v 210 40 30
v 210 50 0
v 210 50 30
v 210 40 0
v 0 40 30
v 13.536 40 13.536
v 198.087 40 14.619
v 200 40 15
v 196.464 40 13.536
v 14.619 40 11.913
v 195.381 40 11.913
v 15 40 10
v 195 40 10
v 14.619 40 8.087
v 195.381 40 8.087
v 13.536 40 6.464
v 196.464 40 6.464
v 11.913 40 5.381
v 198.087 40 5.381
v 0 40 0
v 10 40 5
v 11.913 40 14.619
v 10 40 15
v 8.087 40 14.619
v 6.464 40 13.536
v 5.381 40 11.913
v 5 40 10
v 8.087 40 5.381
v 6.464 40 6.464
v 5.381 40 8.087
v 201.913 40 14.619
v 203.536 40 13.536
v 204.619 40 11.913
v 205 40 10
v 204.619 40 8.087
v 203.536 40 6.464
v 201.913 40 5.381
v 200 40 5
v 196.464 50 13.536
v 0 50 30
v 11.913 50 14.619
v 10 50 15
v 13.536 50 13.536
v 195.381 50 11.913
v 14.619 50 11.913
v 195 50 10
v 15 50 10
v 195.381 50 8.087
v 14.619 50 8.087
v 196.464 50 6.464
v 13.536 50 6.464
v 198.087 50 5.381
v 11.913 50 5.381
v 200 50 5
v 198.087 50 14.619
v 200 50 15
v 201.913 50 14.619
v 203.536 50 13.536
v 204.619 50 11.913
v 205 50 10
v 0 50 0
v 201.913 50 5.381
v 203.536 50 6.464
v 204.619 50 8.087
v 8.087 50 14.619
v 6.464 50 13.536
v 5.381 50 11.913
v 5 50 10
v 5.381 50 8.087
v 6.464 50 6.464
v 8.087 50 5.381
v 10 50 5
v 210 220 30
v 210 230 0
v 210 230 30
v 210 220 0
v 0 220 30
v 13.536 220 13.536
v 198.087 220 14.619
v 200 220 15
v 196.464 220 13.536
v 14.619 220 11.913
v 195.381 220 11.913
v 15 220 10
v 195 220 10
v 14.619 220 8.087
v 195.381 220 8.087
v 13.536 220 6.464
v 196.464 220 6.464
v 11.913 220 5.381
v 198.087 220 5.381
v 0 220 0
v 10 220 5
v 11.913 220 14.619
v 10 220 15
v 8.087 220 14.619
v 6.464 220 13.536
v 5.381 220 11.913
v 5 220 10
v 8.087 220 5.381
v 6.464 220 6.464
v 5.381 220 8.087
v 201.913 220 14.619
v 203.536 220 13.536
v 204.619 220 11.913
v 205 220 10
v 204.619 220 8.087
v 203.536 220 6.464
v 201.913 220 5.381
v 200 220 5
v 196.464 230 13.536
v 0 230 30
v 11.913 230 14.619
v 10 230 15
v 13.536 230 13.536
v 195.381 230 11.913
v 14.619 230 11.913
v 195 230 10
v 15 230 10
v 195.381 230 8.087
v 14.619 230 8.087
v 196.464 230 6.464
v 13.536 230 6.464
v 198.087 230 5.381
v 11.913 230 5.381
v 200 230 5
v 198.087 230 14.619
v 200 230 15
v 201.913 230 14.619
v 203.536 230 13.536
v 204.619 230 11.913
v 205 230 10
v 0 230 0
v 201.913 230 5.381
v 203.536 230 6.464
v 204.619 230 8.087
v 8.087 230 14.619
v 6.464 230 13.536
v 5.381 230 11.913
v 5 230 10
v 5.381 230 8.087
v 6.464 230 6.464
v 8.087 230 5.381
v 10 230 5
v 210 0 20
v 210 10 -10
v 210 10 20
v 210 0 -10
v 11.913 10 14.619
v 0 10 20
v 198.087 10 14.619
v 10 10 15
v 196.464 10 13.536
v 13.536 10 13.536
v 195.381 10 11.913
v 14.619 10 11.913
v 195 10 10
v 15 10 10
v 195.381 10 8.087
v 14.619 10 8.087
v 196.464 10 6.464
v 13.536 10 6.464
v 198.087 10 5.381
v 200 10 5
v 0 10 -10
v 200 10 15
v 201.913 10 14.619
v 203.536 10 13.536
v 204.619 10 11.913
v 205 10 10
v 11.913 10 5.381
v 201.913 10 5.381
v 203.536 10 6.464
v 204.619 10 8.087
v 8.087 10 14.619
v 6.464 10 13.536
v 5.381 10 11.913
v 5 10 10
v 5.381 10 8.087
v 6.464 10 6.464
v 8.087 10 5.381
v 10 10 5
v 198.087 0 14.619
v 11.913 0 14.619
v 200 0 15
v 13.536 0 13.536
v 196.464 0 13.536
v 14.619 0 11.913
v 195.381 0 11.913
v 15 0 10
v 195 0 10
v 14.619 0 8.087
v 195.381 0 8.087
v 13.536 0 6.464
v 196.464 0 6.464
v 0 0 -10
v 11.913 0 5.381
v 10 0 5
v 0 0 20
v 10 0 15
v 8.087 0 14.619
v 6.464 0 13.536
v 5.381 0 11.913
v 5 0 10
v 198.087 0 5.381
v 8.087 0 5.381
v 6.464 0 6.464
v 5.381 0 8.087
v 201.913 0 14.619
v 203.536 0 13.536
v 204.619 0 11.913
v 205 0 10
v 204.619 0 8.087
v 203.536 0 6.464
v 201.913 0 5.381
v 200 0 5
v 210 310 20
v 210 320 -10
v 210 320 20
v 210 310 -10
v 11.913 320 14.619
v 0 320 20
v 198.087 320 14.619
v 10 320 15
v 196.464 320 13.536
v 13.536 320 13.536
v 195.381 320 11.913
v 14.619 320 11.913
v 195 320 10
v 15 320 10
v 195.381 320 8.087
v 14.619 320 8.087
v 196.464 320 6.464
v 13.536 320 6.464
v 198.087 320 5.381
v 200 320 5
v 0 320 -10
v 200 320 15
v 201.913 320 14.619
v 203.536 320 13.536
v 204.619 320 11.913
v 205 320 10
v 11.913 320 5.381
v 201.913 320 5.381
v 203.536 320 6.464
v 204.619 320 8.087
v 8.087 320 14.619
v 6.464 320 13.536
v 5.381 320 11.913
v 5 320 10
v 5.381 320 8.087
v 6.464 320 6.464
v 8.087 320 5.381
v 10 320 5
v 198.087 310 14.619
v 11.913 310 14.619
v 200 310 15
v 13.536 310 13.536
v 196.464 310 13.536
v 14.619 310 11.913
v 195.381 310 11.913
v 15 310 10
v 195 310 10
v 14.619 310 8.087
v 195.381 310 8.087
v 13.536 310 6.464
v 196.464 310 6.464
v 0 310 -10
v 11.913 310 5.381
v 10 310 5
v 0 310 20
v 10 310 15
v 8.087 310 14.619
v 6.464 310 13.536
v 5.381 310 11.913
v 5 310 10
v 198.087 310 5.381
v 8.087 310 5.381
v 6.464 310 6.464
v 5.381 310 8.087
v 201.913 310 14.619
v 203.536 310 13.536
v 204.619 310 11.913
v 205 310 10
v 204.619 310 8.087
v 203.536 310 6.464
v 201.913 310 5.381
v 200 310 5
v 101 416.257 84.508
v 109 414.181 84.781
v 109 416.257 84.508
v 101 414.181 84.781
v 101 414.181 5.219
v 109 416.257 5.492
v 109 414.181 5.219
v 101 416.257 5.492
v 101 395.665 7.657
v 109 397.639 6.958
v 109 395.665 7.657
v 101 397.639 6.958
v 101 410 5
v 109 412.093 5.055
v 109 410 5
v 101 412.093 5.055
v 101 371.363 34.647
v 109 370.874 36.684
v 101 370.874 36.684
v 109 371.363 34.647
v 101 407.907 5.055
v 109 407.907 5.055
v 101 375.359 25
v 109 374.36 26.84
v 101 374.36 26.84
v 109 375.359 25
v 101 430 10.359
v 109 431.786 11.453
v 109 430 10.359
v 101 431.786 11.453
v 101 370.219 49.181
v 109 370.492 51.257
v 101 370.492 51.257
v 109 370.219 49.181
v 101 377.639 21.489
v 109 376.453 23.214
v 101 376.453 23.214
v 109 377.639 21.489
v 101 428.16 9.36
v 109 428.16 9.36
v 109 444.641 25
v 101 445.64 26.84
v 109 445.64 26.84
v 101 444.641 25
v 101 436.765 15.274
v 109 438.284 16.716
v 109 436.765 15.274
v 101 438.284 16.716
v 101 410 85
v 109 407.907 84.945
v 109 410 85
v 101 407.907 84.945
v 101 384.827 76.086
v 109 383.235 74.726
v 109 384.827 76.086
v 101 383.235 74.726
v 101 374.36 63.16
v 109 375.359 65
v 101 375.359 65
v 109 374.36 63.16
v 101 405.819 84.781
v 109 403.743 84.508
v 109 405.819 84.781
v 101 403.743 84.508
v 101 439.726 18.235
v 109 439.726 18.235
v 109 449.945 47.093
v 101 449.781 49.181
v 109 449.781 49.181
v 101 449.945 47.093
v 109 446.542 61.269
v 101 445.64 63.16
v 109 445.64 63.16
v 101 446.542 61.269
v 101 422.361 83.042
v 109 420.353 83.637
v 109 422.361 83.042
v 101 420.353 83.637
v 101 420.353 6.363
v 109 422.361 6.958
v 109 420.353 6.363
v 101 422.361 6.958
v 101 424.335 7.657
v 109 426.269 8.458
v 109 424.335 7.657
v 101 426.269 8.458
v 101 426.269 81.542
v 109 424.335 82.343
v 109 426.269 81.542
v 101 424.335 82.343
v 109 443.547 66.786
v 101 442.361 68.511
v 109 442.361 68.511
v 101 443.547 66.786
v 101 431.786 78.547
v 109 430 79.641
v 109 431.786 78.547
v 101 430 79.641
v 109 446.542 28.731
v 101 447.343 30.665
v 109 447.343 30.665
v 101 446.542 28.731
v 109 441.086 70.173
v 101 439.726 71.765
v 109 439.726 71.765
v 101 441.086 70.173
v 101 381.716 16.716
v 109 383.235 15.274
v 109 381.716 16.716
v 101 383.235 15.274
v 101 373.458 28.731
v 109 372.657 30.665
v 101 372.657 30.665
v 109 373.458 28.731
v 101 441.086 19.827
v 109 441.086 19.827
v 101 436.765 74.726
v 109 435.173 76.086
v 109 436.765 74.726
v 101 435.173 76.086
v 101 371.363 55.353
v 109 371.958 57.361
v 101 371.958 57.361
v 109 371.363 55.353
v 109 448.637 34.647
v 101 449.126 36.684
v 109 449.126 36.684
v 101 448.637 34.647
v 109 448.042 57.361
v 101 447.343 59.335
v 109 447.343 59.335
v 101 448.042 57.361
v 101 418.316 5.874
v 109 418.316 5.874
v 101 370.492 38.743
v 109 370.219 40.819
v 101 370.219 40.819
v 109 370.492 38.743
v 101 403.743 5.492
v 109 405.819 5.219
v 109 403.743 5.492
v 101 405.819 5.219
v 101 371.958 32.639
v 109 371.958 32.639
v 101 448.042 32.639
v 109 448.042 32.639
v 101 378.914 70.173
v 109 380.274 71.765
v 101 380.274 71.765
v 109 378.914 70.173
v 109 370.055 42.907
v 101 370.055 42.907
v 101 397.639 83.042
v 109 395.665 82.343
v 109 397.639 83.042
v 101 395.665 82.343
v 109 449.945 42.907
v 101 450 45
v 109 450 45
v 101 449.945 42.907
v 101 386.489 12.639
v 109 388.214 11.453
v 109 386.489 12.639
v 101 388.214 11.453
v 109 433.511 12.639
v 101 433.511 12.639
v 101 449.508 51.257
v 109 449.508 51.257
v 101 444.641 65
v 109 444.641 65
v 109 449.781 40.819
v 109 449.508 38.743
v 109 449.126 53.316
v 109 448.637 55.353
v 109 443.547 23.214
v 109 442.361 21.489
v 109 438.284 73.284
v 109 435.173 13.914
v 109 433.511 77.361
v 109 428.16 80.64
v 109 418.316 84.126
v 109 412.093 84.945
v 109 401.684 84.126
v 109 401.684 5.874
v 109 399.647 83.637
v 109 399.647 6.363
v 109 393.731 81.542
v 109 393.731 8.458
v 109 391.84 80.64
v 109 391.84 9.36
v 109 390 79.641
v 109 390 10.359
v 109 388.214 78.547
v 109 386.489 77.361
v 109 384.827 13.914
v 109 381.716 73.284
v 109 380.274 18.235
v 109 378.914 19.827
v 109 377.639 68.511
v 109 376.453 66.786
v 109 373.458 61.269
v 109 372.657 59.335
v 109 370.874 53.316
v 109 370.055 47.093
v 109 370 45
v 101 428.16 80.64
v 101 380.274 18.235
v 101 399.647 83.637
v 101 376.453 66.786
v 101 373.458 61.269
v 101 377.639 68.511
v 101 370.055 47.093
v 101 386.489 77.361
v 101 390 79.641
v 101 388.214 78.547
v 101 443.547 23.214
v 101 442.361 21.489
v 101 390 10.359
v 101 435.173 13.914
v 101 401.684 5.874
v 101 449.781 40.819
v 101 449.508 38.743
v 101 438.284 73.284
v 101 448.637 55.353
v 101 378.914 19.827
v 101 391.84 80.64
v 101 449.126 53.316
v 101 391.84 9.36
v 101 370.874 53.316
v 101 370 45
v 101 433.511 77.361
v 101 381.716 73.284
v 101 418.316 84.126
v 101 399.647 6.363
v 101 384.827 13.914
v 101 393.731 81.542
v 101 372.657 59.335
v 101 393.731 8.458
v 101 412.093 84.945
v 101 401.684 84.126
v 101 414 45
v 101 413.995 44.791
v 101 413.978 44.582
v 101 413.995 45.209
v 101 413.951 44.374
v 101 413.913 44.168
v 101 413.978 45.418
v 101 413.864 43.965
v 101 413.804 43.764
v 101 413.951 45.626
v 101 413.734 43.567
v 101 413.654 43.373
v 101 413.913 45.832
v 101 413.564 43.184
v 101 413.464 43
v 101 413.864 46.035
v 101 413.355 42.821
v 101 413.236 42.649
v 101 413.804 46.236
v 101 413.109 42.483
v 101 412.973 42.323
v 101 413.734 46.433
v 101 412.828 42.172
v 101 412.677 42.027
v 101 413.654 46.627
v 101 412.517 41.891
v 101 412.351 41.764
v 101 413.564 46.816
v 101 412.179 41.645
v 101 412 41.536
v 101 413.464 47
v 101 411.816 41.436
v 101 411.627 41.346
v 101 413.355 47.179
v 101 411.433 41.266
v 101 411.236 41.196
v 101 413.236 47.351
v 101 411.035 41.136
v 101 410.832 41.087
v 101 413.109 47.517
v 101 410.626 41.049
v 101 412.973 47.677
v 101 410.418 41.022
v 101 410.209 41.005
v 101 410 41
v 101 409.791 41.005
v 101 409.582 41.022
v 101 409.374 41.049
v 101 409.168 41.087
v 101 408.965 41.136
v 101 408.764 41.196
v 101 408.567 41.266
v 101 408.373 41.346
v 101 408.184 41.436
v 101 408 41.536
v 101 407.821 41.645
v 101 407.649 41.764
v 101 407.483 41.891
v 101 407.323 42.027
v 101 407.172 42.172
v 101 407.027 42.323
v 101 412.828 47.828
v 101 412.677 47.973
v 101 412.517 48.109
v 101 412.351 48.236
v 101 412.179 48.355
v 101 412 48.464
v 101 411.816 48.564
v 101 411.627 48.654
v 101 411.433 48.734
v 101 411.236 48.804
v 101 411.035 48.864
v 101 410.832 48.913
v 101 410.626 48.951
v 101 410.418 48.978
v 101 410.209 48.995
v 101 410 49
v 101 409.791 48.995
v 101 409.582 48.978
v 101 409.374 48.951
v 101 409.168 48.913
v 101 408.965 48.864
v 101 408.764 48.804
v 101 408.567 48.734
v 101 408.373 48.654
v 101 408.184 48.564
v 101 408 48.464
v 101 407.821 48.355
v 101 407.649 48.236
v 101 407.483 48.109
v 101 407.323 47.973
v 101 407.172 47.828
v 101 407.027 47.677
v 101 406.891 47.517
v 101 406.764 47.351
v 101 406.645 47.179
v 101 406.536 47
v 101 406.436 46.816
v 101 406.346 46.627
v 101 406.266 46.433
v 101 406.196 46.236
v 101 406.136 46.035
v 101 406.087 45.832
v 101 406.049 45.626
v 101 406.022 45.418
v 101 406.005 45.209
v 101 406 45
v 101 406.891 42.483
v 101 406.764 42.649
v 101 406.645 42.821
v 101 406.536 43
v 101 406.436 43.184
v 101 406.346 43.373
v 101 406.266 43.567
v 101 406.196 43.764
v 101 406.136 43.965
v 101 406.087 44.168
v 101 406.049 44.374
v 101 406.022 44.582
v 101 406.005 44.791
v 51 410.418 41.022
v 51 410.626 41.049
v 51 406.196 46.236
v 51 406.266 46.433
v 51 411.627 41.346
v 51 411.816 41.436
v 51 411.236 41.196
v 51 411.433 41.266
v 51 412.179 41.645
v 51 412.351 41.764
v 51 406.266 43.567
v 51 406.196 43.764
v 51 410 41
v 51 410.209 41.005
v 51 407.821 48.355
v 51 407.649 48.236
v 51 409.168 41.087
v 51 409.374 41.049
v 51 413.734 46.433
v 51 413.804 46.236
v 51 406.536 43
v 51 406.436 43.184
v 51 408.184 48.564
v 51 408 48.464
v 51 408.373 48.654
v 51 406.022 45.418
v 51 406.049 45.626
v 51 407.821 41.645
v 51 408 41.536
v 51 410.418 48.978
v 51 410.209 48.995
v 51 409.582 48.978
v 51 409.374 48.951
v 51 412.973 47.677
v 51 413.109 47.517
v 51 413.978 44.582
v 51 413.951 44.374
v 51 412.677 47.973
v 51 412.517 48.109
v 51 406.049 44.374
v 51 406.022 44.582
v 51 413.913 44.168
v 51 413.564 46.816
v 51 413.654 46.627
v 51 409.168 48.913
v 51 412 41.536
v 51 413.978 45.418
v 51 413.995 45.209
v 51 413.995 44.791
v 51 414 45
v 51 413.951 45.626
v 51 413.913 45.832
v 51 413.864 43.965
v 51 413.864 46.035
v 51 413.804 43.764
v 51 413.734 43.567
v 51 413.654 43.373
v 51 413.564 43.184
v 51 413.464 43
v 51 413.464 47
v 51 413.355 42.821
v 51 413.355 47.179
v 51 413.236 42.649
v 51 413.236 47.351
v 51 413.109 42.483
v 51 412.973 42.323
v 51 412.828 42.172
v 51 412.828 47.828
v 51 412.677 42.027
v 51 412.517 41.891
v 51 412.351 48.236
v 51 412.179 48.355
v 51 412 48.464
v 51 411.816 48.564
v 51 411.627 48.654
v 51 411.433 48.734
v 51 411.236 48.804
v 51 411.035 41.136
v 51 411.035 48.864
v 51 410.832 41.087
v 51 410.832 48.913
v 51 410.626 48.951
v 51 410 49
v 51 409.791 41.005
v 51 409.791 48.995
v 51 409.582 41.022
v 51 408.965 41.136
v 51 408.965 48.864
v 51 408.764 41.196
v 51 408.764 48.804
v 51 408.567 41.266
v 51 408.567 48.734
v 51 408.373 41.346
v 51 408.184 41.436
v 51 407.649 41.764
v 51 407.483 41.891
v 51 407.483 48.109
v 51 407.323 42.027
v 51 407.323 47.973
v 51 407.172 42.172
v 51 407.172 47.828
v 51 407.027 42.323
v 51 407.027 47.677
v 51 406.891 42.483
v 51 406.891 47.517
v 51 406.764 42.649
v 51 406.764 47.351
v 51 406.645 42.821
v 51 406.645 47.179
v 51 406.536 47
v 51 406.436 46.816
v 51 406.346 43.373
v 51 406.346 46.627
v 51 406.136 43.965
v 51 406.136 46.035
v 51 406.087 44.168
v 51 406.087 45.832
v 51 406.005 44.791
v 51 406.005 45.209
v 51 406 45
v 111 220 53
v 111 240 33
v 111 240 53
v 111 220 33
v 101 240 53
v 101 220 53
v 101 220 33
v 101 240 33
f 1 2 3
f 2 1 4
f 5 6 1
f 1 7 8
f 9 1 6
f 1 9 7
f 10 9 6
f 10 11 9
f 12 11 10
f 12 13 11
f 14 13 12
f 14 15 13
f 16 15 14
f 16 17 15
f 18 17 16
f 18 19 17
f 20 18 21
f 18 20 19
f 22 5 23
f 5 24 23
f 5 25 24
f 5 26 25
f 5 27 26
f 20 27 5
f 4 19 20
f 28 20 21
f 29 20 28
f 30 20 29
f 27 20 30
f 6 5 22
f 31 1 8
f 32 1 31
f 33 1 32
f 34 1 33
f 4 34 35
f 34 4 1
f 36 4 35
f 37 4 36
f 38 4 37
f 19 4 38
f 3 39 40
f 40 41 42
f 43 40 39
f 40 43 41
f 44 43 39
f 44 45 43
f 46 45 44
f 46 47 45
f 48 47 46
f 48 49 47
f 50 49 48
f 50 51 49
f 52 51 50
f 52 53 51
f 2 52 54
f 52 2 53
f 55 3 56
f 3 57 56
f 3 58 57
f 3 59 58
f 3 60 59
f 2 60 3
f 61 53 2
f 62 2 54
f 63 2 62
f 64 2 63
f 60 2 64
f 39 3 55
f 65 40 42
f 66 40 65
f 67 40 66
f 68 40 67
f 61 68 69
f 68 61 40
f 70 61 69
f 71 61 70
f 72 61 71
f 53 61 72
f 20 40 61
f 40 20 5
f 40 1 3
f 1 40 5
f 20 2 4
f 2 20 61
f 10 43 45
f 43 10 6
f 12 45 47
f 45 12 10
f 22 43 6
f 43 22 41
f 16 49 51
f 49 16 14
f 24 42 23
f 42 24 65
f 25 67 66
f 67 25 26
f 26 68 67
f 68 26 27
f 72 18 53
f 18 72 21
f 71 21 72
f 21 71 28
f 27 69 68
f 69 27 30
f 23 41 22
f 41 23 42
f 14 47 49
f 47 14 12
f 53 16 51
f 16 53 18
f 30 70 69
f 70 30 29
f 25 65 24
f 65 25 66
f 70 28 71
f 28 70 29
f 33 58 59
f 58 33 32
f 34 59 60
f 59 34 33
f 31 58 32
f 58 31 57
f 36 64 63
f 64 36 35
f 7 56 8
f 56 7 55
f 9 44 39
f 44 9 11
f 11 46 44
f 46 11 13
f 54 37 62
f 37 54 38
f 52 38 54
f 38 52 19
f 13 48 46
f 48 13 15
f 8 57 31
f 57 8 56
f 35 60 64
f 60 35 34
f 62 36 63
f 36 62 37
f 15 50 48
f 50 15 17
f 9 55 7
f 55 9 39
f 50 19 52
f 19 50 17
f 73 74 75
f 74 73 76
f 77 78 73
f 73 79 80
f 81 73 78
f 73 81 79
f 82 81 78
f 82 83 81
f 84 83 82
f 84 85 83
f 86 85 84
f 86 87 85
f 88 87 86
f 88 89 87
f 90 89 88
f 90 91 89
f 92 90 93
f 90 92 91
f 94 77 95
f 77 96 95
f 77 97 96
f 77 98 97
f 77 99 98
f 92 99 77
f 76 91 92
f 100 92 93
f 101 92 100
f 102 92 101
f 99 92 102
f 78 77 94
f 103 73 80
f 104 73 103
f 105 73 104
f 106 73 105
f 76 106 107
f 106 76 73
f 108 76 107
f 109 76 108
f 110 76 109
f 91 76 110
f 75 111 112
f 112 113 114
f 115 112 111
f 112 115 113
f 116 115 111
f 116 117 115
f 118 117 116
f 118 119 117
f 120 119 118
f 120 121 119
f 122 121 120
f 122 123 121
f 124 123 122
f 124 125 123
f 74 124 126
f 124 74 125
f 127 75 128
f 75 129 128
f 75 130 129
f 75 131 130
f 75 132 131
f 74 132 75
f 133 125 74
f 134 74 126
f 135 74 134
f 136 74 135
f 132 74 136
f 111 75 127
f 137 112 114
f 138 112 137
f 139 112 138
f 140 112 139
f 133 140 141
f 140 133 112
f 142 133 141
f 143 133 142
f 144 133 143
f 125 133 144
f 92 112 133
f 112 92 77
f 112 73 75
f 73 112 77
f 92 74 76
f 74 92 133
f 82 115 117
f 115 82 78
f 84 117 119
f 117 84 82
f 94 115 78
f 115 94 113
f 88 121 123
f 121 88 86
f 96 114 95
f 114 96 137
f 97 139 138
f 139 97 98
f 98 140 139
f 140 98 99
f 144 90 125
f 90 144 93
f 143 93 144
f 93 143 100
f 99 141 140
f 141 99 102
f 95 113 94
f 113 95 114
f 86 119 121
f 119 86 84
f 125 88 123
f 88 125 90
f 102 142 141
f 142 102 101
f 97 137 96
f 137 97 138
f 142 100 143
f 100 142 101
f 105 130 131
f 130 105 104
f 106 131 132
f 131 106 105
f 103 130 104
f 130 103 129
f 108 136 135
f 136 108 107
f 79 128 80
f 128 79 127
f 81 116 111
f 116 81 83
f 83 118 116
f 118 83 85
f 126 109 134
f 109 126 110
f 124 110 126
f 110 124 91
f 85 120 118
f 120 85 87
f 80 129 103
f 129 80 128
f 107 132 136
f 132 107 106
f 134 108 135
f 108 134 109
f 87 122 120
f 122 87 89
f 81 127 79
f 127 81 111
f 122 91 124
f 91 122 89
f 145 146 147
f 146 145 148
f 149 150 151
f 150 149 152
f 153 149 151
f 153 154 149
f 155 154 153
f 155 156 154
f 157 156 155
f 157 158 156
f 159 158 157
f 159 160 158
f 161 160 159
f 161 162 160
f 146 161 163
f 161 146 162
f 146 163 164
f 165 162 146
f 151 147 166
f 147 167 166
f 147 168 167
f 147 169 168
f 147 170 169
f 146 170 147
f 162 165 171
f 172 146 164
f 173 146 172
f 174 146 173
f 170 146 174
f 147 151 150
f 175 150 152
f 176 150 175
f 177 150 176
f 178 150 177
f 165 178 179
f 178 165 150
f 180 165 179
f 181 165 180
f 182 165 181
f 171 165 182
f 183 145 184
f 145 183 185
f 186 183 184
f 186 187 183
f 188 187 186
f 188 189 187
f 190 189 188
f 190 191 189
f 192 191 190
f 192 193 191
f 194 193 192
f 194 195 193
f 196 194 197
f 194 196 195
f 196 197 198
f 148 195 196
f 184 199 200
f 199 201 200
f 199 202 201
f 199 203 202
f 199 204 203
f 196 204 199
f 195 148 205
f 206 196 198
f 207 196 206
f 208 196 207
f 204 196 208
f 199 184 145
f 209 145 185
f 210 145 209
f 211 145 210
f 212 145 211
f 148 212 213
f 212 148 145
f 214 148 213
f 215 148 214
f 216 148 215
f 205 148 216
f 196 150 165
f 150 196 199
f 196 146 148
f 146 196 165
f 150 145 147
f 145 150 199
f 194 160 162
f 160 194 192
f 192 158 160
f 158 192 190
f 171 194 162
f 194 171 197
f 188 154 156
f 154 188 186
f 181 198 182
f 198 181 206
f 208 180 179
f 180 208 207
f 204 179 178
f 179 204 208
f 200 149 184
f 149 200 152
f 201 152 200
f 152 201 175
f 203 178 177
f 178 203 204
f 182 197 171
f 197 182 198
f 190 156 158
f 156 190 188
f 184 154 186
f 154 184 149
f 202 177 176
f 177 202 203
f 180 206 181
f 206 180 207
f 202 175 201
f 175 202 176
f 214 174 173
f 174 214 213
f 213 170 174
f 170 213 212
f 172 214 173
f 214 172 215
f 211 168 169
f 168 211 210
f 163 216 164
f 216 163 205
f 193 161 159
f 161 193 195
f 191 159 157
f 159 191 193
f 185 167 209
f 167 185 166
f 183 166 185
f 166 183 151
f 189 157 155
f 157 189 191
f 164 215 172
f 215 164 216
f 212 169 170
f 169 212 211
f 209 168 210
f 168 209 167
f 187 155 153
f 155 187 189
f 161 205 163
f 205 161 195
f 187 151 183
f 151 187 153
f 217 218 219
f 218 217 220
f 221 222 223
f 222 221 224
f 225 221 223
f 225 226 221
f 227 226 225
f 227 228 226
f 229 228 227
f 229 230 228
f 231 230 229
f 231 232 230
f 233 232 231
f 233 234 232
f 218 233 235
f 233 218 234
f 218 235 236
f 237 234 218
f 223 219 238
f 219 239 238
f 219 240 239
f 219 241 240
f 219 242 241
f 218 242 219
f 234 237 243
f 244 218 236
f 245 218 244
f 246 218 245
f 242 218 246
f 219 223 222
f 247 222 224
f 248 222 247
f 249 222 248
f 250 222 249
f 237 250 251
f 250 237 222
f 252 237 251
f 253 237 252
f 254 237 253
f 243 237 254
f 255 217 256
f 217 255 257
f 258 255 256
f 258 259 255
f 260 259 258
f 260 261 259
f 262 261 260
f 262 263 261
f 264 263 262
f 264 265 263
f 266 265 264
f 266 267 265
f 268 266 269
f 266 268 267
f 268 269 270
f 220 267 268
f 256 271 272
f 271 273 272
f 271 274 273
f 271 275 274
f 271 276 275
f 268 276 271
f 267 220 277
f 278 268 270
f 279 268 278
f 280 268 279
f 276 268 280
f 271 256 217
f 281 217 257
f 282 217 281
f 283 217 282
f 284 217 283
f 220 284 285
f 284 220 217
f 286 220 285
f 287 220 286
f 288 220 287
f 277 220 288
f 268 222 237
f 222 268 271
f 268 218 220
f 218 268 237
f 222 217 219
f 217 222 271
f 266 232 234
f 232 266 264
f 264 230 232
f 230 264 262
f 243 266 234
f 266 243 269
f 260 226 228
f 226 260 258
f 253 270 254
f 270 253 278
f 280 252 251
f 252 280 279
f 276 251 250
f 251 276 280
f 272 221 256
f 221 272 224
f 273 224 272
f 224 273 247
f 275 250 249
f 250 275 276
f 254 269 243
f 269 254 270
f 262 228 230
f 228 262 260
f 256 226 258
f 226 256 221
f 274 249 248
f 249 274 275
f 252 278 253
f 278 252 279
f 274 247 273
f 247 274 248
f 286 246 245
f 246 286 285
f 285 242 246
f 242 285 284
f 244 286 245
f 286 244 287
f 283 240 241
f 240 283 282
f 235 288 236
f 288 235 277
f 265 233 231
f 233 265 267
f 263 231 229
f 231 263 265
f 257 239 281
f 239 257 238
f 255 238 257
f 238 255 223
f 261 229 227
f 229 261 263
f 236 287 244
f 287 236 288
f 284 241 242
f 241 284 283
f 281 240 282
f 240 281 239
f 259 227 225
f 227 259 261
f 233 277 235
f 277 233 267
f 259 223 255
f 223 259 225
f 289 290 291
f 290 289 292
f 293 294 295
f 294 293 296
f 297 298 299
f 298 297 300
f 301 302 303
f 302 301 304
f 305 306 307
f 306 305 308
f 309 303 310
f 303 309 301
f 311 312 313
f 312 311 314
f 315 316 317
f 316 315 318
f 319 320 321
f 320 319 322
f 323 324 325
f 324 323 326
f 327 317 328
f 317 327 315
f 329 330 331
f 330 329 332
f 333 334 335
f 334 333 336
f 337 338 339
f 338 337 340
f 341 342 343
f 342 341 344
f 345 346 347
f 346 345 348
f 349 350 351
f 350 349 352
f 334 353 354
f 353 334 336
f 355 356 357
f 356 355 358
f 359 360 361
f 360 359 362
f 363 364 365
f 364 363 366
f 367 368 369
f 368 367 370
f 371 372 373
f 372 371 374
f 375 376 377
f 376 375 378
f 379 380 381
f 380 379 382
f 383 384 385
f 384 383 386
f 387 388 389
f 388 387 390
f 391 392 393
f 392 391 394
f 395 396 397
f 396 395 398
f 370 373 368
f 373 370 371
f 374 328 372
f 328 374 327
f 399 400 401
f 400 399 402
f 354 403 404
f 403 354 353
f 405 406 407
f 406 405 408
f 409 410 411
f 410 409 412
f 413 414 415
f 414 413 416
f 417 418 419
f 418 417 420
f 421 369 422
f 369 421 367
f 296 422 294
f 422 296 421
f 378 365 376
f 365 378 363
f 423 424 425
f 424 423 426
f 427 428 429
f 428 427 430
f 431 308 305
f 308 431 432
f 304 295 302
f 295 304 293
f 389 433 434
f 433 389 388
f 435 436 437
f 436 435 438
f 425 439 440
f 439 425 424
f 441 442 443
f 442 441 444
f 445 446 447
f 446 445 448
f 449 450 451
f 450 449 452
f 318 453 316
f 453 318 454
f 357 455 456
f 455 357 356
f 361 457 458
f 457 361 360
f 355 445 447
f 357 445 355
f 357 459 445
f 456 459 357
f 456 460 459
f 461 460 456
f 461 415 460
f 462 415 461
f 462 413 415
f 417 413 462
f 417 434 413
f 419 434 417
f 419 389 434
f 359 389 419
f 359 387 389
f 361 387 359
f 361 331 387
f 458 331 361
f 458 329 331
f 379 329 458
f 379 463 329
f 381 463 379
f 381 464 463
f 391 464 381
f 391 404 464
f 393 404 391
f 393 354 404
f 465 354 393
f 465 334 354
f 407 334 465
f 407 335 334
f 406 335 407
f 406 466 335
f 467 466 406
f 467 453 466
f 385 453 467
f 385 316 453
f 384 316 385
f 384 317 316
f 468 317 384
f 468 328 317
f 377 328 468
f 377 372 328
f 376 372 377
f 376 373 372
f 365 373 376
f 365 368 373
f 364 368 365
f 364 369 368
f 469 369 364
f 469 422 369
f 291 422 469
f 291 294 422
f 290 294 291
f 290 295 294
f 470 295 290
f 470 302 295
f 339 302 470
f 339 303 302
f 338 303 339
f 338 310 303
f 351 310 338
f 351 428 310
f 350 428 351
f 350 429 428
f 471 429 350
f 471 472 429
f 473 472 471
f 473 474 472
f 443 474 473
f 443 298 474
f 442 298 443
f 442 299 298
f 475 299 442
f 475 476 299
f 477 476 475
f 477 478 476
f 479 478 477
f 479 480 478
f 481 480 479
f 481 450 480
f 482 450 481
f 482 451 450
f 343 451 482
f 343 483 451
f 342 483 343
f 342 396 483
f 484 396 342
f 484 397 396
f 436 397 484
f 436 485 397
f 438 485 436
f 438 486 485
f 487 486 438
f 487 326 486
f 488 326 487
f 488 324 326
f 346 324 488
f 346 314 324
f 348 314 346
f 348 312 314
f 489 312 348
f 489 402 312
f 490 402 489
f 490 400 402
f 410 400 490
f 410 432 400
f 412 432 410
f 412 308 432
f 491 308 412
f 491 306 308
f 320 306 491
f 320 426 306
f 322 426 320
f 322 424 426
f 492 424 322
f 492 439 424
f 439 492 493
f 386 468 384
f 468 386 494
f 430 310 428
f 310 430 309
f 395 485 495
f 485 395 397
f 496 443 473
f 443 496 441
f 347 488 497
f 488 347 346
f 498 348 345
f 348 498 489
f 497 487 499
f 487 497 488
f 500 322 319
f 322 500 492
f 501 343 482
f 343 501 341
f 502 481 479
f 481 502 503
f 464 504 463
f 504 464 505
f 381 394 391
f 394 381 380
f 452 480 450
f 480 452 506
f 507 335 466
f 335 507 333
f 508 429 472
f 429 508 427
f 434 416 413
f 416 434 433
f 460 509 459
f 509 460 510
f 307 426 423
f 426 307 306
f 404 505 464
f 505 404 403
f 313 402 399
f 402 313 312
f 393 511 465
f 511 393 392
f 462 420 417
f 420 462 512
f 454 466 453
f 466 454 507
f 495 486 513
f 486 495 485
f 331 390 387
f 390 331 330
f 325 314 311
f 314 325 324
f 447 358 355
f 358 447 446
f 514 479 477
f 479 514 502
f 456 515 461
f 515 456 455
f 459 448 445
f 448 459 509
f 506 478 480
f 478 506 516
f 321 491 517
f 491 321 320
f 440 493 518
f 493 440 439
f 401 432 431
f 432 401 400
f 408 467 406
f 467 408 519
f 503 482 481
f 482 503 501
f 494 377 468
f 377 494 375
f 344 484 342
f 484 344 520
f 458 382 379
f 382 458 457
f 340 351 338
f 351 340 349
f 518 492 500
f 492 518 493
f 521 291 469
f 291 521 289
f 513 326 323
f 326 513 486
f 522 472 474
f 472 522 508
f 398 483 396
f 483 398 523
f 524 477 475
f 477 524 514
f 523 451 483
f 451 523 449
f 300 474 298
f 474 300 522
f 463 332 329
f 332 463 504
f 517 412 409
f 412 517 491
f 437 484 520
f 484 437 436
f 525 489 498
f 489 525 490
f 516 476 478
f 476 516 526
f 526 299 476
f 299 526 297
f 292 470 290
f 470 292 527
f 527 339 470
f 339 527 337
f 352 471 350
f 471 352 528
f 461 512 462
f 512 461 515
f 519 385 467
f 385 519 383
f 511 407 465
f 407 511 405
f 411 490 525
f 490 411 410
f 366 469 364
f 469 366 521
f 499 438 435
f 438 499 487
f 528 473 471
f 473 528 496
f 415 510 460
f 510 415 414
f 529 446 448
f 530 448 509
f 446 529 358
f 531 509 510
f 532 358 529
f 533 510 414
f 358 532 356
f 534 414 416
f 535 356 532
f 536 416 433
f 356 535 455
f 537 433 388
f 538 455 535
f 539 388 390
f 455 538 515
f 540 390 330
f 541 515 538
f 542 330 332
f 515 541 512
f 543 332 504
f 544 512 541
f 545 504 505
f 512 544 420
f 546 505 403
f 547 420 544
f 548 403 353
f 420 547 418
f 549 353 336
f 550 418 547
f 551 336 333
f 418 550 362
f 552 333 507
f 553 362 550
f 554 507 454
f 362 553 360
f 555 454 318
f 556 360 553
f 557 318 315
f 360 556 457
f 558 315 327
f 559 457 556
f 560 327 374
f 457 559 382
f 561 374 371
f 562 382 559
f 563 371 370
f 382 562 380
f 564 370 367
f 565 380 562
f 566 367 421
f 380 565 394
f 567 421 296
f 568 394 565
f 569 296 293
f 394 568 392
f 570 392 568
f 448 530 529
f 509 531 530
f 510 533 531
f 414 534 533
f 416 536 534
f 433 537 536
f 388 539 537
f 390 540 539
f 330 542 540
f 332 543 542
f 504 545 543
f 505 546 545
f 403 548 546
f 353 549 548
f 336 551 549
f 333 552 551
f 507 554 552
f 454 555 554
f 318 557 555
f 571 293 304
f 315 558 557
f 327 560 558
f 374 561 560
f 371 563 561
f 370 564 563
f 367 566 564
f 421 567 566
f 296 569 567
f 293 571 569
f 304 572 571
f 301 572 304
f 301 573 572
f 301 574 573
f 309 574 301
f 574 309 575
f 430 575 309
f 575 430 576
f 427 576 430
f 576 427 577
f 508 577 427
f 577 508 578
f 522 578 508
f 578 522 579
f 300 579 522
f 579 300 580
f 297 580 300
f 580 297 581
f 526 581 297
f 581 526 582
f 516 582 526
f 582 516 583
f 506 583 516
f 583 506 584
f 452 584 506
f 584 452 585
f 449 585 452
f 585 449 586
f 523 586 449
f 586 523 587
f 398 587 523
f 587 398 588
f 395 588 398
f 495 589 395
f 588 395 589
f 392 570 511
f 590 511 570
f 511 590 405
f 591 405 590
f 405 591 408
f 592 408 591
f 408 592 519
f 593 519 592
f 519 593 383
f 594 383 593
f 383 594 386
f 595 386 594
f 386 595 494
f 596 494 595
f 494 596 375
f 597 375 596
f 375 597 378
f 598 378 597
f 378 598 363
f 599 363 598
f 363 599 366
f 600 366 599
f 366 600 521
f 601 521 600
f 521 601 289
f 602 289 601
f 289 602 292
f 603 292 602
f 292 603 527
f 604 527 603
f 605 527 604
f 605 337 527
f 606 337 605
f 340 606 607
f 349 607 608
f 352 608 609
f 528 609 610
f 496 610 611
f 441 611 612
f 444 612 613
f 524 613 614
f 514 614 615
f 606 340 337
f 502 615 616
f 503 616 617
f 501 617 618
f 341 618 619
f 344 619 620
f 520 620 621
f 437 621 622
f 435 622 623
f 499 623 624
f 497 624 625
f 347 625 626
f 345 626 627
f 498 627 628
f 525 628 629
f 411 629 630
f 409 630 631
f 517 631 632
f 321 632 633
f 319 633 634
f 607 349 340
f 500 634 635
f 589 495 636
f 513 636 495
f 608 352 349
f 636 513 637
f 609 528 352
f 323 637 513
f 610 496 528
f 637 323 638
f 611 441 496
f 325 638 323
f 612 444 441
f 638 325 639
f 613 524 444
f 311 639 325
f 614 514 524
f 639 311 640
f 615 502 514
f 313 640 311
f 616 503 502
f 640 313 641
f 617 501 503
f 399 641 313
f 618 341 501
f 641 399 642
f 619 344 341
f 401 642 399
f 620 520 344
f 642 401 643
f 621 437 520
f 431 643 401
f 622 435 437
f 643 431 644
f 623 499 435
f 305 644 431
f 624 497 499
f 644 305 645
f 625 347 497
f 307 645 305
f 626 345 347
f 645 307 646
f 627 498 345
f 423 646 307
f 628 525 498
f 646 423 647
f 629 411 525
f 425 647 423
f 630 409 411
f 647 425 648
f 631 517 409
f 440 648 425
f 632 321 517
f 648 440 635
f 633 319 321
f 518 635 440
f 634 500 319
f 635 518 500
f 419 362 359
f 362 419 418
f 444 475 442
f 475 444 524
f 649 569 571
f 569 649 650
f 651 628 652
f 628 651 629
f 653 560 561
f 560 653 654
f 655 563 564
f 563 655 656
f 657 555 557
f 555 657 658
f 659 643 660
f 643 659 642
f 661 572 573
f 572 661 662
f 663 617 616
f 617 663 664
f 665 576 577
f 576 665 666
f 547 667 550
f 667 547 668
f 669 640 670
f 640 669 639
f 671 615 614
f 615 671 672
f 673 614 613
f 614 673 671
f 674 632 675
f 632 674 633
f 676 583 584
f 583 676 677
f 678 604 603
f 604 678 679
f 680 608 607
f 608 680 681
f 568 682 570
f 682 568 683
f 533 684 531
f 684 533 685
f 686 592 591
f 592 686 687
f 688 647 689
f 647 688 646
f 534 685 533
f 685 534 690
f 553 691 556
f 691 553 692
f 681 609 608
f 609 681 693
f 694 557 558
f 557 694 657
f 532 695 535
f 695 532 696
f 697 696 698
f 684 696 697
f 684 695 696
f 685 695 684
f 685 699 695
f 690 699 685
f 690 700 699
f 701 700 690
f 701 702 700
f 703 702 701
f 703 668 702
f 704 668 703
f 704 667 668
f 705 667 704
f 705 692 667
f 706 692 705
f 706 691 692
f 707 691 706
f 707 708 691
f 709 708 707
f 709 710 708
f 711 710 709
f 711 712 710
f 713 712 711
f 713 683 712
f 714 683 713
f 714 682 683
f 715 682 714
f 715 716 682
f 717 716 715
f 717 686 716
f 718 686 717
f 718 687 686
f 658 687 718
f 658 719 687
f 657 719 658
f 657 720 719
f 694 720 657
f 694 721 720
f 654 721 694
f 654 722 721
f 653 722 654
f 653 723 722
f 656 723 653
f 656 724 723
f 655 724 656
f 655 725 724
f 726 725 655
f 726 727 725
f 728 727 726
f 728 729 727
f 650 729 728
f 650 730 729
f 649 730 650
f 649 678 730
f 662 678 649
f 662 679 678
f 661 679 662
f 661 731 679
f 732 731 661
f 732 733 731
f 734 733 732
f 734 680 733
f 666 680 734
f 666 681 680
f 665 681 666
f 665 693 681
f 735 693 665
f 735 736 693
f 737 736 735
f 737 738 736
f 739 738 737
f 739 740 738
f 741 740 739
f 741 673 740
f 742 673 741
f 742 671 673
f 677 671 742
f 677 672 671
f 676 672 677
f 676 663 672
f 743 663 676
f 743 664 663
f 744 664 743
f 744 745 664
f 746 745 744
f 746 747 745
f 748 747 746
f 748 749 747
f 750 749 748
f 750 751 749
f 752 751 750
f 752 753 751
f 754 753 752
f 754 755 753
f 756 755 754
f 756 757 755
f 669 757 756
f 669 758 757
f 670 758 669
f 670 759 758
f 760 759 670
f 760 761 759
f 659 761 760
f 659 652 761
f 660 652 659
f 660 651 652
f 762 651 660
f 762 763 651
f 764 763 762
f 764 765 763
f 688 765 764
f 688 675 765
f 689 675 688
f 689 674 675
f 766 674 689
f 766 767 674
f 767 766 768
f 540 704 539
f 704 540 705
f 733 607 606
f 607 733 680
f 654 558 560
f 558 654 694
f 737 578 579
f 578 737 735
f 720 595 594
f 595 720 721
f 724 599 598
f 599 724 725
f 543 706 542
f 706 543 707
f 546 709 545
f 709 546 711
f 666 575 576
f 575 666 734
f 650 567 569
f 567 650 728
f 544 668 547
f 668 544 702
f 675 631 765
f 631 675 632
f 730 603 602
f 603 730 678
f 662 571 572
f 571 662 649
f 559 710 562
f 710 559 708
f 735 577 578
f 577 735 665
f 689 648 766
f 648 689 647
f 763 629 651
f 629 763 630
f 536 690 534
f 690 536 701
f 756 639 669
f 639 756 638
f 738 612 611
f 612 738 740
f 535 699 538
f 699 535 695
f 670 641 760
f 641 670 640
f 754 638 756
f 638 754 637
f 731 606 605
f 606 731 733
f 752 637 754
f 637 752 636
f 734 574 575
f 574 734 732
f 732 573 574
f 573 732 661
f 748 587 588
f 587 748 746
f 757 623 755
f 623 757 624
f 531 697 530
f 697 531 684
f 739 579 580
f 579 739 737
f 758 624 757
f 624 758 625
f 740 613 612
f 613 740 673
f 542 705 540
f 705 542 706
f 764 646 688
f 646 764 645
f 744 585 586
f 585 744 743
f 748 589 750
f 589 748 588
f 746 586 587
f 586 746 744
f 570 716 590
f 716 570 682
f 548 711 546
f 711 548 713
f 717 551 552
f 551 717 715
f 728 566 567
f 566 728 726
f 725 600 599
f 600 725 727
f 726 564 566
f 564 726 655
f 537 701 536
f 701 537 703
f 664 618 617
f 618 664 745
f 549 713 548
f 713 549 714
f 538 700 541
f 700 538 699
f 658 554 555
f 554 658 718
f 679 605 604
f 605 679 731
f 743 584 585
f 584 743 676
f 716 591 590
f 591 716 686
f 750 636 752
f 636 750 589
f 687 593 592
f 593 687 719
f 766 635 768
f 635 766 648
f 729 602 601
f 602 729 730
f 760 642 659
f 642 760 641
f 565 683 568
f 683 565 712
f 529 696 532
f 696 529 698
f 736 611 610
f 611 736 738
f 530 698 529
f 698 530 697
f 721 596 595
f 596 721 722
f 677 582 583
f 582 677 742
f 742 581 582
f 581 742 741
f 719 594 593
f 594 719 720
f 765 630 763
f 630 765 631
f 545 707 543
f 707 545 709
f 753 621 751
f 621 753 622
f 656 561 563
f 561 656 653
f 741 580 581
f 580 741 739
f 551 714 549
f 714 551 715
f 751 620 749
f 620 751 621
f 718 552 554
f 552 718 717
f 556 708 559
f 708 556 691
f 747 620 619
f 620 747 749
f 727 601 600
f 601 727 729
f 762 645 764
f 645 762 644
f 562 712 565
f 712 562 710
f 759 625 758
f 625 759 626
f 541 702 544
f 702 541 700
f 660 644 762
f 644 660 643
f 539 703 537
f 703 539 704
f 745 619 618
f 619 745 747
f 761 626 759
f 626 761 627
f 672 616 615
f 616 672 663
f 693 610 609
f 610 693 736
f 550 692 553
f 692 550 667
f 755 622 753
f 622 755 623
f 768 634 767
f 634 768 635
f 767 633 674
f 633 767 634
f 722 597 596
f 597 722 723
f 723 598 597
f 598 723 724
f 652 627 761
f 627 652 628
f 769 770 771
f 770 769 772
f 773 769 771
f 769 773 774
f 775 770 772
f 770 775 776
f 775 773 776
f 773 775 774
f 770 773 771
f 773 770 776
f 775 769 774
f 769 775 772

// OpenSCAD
translate([0,50,0])rotate([90,0,0])guia();
translate([0,230,0])rotate([90,0,0])guia();
translate([0,0,20])rotate([-90,0,0])guia();
translate([0,310,20])rotate([-90,0,0])guia();
%translate([10,0,10])rotate([-90,0,0])cylinder(d=10,h=320,$fn=60);
%translate([200,0,10])rotate([-90,0,0])cylinder(d=10,h=320,$fn=60);
%translate([0,30,30])cube([210,210,3]);
%translate([0,0,-29])cube([210,450,19]);

translate([101,410,45])rotate([0,90,0])cylinder(d=80,h=8,$fn=120);
translate([51,410,45])rotate([0,90,0])cylinder(d=8,h=50,$fn=120);
%translate([65,395,-10])cube([35,30,70]);
translate([101,220,33])cube([10,20,20]);

module guia(){
difference(){
cube([210,30,10]);
translate([10,10,-1])cylinder(d=10,h=12);
translate([200,10,-1])cylinder(d=10,h=12);
}
}
